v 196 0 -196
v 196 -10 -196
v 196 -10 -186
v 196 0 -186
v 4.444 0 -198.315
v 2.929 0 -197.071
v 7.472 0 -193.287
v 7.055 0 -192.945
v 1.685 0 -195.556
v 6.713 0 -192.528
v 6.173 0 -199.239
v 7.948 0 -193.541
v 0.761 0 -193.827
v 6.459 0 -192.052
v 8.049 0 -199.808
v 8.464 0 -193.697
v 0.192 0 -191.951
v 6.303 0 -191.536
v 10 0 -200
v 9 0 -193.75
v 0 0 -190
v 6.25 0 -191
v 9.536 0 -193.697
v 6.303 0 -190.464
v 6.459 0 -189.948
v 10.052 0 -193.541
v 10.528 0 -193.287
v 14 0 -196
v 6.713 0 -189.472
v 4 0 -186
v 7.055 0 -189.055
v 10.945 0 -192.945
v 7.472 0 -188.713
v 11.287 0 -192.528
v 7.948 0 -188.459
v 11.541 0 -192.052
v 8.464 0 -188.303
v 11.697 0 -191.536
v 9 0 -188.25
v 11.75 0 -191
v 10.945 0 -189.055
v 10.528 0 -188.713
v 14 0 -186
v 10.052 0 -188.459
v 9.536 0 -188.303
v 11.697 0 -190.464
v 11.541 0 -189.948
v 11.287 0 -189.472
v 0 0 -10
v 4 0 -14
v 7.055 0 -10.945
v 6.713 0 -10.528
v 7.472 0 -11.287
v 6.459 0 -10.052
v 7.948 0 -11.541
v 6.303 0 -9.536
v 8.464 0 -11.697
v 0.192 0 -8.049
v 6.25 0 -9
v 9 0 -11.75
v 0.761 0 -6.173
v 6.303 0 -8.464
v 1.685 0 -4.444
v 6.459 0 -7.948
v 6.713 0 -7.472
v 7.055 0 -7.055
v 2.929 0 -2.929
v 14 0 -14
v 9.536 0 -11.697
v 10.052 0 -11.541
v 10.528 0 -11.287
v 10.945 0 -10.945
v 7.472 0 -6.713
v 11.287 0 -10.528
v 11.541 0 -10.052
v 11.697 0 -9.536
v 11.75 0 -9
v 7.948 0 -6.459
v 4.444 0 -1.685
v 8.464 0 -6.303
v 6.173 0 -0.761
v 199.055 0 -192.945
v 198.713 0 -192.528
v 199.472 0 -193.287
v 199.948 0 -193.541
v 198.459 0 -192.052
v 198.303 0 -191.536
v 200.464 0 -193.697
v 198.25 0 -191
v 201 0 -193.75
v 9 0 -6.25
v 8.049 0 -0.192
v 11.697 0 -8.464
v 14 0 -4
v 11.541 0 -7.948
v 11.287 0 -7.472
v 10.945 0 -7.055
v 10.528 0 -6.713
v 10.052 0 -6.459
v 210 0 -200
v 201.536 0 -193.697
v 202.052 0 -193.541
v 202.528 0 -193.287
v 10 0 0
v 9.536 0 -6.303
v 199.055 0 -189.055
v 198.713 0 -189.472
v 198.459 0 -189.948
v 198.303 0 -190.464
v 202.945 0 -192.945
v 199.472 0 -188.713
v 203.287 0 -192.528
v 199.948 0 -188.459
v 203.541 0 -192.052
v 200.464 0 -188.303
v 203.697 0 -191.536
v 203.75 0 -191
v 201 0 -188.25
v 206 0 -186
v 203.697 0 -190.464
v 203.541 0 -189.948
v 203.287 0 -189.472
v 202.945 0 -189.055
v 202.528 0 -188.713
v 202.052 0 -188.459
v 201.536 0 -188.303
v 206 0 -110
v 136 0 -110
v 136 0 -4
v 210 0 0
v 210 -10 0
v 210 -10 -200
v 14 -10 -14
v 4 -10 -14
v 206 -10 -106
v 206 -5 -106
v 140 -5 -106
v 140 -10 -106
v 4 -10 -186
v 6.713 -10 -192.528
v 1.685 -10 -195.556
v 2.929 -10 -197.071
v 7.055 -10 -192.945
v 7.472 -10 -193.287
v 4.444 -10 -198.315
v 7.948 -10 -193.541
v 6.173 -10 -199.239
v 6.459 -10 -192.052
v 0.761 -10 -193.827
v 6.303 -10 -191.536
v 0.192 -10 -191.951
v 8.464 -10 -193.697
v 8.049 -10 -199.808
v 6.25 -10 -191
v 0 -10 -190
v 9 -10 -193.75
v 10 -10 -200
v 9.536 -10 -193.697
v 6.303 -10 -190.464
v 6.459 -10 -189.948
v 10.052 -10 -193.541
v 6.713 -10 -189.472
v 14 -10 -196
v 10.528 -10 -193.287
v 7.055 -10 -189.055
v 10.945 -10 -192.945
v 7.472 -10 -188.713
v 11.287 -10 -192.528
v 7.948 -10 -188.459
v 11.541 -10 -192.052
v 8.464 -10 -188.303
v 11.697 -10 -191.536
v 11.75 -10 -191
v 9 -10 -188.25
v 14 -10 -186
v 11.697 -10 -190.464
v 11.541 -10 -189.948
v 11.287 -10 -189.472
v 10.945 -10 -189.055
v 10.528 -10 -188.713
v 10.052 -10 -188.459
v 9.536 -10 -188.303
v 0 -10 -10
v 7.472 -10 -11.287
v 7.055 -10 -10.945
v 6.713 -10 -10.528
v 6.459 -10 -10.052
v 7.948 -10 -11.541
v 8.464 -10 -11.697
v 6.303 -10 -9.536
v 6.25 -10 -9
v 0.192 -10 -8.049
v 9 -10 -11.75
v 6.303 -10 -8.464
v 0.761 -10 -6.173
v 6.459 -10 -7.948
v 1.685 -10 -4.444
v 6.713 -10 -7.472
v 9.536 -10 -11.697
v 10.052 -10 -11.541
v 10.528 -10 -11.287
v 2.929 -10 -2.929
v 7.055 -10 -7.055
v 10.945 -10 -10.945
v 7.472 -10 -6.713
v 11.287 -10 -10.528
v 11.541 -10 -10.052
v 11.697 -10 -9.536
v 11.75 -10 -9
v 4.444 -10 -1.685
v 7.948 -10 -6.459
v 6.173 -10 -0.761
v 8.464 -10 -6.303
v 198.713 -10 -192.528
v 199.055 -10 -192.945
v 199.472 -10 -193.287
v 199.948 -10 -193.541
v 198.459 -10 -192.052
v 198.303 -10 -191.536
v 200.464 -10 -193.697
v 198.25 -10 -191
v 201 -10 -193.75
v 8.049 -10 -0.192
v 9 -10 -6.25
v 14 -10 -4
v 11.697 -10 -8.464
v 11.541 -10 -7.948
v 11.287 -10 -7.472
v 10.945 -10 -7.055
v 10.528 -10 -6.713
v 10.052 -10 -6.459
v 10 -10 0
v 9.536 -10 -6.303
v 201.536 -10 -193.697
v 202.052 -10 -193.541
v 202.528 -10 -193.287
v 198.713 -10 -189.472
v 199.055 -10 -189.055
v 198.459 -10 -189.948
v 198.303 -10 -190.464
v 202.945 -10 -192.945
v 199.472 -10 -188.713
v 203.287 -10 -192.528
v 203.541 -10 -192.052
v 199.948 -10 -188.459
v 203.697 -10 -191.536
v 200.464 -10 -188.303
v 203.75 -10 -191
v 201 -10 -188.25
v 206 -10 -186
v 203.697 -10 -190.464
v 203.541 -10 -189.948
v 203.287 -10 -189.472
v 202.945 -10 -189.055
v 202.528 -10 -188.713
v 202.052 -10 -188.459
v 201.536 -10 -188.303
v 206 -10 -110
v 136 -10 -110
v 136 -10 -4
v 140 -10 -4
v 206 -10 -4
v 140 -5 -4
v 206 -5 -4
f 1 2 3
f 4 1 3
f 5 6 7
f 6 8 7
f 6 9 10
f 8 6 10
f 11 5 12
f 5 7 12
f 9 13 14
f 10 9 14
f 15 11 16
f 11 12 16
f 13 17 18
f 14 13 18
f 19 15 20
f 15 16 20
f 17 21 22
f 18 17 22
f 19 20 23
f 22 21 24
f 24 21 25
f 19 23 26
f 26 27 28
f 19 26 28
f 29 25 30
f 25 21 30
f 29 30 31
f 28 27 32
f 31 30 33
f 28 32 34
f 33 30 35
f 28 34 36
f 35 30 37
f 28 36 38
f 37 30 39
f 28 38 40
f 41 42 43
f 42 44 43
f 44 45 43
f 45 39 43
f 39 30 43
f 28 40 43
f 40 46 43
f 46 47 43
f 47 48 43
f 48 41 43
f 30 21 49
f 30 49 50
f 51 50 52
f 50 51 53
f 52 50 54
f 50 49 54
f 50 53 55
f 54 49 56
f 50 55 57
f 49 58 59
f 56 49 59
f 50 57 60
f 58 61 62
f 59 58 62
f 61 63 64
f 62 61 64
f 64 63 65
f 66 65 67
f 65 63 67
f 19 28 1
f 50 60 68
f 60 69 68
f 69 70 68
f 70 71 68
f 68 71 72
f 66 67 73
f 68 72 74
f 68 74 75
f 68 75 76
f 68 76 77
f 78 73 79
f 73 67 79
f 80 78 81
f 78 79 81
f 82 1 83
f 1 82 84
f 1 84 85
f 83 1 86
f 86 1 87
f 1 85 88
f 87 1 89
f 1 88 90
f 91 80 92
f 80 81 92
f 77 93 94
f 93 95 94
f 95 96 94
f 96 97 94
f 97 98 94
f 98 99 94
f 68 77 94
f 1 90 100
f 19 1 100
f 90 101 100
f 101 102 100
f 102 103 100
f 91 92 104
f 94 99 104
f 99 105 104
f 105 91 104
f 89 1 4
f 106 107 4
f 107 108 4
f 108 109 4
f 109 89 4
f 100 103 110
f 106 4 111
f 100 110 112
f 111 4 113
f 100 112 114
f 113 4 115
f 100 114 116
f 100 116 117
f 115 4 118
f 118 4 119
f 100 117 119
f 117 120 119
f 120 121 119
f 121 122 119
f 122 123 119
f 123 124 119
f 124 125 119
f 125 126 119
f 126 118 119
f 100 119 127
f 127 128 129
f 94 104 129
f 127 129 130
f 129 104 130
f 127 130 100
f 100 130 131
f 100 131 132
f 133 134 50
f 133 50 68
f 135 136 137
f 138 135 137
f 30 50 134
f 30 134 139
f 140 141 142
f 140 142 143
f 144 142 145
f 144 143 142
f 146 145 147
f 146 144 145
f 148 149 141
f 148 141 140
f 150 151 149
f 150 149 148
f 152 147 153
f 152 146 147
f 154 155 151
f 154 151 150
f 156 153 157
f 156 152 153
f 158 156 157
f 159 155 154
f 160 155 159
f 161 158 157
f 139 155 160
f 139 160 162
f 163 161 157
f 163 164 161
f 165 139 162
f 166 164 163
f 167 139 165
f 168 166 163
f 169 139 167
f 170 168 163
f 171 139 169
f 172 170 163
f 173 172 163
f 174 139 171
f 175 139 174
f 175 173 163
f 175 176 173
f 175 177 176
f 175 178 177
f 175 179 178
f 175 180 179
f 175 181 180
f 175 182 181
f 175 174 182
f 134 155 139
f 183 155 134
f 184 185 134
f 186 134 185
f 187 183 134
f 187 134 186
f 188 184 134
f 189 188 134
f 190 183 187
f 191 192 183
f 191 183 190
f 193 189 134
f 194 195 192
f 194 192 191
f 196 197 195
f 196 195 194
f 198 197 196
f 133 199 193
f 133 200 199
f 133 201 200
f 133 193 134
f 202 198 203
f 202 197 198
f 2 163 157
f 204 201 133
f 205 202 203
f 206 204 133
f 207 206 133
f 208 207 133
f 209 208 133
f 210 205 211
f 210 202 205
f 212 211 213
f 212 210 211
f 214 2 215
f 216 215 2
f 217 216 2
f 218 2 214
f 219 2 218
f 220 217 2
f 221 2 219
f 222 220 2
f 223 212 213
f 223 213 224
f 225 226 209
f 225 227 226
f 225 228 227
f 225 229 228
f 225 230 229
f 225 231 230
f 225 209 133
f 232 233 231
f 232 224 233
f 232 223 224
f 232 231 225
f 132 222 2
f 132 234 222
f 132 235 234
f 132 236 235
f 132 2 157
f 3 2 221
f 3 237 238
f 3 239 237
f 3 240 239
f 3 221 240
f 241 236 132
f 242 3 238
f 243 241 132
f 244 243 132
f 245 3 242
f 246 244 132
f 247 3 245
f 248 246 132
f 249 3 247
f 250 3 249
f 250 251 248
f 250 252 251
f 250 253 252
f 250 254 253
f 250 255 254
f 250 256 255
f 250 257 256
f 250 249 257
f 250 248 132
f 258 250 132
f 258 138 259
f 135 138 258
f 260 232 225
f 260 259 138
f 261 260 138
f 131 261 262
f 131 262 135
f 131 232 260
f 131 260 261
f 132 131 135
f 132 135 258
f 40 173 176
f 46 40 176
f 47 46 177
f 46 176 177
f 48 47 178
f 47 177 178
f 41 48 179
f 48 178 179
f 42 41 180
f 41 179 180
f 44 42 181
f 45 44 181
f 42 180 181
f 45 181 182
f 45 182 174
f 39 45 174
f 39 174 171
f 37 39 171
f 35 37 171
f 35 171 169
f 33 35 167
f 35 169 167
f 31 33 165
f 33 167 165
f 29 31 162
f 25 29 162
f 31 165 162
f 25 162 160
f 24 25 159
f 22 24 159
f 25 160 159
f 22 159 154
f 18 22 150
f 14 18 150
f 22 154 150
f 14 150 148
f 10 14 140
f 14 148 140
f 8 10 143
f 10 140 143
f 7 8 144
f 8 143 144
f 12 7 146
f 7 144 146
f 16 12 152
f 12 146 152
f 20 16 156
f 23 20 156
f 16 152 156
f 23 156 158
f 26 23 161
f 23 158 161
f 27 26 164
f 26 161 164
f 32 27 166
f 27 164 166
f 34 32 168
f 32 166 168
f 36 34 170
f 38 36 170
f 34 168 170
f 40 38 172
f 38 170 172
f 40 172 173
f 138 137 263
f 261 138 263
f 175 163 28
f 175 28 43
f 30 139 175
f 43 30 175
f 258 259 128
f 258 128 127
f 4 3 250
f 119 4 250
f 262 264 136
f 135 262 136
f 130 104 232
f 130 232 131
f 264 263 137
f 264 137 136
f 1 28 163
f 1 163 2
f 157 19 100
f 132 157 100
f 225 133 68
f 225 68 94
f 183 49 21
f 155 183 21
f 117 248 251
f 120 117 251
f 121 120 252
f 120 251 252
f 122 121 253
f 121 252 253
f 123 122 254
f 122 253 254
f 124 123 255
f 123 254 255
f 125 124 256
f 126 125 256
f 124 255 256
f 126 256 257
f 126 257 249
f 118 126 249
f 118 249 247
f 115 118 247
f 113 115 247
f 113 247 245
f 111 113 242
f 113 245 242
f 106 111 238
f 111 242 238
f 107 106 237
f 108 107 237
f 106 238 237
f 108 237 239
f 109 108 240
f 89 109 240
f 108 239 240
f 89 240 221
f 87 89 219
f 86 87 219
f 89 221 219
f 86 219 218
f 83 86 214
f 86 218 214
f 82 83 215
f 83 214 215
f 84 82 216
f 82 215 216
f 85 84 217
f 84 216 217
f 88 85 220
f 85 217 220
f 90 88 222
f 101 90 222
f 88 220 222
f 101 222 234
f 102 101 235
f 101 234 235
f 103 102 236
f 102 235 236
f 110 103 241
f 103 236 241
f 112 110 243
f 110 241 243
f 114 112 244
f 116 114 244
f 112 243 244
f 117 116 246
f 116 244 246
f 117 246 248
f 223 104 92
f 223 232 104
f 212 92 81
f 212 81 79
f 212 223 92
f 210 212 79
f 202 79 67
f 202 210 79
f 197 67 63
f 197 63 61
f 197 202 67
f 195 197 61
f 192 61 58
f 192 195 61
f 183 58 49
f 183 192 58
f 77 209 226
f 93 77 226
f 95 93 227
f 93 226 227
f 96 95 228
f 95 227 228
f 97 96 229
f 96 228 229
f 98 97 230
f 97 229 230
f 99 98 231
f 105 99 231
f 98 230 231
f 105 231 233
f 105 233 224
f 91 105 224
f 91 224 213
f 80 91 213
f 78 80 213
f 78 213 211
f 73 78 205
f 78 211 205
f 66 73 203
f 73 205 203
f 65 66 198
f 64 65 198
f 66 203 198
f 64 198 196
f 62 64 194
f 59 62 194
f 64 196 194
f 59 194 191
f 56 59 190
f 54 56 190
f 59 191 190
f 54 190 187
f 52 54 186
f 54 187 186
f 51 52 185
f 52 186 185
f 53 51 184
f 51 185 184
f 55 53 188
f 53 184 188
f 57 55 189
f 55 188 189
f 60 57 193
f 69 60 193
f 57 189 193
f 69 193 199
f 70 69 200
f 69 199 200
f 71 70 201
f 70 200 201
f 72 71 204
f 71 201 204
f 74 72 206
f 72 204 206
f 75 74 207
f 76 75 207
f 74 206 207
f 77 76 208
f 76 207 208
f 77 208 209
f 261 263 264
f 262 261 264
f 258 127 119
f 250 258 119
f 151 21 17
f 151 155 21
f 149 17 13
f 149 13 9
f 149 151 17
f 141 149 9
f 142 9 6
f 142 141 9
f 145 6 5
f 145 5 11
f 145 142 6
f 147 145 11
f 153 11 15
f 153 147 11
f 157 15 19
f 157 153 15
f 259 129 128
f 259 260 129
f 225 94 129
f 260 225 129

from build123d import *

# Parameters (mm, degrees)
SKETCH1_W                = 210
SKETCH1_H                = 200
SKETCH1_W_2              = 202
SKETCH1_H_2              = 192
BOSS_EXTRUDE1_DEPTH      = 10
SKETCH2_W                = 70
SKETCH2_H                = 106
BOSS_EXTRUDE2_DEPTH      = 10
SKETCH3_W                = 66
SKETCH3_H                = 102
CUT_EXTRUDE1_DEPTH       = 5
SKETCH4_W                = 10
SKETCH4_H                = 10
SKETCH4_R                = 2.75
BOSS_EXTRUDE3_DEPTH      = 10
FILLET1_R                = 10
BOSS_EXTRUDE4_DEPTH      = 5
BOSS_EXTRUDE4_DEPTH_BACK = 5


with BuildPart() as part:
    # Sketch1 → Boss-Extrude1 (new body)
    with BuildSketch(Plane(origin=(0, 0, 0), x_dir=(1, 0, 0), z_dir=(0, 1, 0))):
        with Locations((105, 100)):
            Rectangle(SKETCH1_W, SKETCH1_H)
        with Locations((105, 100)):
            Rectangle(SKETCH1_W_2, SKETCH1_H_2, mode=Mode.SUBTRACT)
    extrude(amount=-BOSS_EXTRUDE1_DEPTH)

    # Sketch2 → Boss-Extrude2 (add)
    with BuildSketch(Plane.XZ.offset(10)):
        with Locations((175, -53)):
            Rectangle(SKETCH2_W, SKETCH2_H)
    extrude(amount=-BOSS_EXTRUDE2_DEPTH)

    # Sketch3 → Cut-Extrude1 (cut)
    with BuildSketch(Plane.XZ.offset(10)):
        with Locations((173, -55)):
            Rectangle(SKETCH3_W, SKETCH3_H)
    extrude(amount=-CUT_EXTRUDE1_DEPTH, mode=Mode.SUBTRACT)

    # Sketch4 → Boss-Extrude3 (add)
    # profile 1 of 3: a face of its own
    with BuildSketch(Plane.XZ.offset(10)):
        with Locations((9, -9)):
            Rectangle(SKETCH4_W, SKETCH4_H)
        with Locations((9, -9)):
            Circle(SKETCH4_R, mode=Mode.SUBTRACT)
    # profile 2 of 3: a face of its own
    with BuildSketch(Plane.XZ.offset(10)):
        with Locations((9, -191)):
            Rectangle(SKETCH4_W, SKETCH4_H)
        with Locations((9, -191)):
            Circle(SKETCH4_R, mode=Mode.SUBTRACT)
    # profile 3 of 3: a face of its own
    with BuildSketch(Plane.XZ.offset(10)):
        with Locations((201, -191)):
            Rectangle(SKETCH4_W, SKETCH4_H)
        with Locations((201, -191)):
            Circle(SKETCH4_R, mode=Mode.SUBTRACT)
    extrude(amount=-BOSS_EXTRUDE3_DEPTH)

    # Fillet1
    fillet1_edges = [part.edges().sort_by_distance(p)[0] for p in [
        (0, -5, 0),
        (0, -5, -200),
    ]]
    fillet(fillet1_edges, radius=FILLET1_R)

    # Sketch5 → Boss-Extrude4 (add, two sides: drawn at the far end of the back side and taken through both)
    with BuildSketch(Plane.XZ.offset(5).offset(-BOSS_EXTRUDE4_DEPTH_BACK)):
        Polygon((206, -110), (206, -106), (140, -106), (140, -4), (136, -4), (136, -110), align=None)
    extrude(amount=BOSS_EXTRUDE4_DEPTH + BOSS_EXTRUDE4_DEPTH_BACK)


solid = part.part
